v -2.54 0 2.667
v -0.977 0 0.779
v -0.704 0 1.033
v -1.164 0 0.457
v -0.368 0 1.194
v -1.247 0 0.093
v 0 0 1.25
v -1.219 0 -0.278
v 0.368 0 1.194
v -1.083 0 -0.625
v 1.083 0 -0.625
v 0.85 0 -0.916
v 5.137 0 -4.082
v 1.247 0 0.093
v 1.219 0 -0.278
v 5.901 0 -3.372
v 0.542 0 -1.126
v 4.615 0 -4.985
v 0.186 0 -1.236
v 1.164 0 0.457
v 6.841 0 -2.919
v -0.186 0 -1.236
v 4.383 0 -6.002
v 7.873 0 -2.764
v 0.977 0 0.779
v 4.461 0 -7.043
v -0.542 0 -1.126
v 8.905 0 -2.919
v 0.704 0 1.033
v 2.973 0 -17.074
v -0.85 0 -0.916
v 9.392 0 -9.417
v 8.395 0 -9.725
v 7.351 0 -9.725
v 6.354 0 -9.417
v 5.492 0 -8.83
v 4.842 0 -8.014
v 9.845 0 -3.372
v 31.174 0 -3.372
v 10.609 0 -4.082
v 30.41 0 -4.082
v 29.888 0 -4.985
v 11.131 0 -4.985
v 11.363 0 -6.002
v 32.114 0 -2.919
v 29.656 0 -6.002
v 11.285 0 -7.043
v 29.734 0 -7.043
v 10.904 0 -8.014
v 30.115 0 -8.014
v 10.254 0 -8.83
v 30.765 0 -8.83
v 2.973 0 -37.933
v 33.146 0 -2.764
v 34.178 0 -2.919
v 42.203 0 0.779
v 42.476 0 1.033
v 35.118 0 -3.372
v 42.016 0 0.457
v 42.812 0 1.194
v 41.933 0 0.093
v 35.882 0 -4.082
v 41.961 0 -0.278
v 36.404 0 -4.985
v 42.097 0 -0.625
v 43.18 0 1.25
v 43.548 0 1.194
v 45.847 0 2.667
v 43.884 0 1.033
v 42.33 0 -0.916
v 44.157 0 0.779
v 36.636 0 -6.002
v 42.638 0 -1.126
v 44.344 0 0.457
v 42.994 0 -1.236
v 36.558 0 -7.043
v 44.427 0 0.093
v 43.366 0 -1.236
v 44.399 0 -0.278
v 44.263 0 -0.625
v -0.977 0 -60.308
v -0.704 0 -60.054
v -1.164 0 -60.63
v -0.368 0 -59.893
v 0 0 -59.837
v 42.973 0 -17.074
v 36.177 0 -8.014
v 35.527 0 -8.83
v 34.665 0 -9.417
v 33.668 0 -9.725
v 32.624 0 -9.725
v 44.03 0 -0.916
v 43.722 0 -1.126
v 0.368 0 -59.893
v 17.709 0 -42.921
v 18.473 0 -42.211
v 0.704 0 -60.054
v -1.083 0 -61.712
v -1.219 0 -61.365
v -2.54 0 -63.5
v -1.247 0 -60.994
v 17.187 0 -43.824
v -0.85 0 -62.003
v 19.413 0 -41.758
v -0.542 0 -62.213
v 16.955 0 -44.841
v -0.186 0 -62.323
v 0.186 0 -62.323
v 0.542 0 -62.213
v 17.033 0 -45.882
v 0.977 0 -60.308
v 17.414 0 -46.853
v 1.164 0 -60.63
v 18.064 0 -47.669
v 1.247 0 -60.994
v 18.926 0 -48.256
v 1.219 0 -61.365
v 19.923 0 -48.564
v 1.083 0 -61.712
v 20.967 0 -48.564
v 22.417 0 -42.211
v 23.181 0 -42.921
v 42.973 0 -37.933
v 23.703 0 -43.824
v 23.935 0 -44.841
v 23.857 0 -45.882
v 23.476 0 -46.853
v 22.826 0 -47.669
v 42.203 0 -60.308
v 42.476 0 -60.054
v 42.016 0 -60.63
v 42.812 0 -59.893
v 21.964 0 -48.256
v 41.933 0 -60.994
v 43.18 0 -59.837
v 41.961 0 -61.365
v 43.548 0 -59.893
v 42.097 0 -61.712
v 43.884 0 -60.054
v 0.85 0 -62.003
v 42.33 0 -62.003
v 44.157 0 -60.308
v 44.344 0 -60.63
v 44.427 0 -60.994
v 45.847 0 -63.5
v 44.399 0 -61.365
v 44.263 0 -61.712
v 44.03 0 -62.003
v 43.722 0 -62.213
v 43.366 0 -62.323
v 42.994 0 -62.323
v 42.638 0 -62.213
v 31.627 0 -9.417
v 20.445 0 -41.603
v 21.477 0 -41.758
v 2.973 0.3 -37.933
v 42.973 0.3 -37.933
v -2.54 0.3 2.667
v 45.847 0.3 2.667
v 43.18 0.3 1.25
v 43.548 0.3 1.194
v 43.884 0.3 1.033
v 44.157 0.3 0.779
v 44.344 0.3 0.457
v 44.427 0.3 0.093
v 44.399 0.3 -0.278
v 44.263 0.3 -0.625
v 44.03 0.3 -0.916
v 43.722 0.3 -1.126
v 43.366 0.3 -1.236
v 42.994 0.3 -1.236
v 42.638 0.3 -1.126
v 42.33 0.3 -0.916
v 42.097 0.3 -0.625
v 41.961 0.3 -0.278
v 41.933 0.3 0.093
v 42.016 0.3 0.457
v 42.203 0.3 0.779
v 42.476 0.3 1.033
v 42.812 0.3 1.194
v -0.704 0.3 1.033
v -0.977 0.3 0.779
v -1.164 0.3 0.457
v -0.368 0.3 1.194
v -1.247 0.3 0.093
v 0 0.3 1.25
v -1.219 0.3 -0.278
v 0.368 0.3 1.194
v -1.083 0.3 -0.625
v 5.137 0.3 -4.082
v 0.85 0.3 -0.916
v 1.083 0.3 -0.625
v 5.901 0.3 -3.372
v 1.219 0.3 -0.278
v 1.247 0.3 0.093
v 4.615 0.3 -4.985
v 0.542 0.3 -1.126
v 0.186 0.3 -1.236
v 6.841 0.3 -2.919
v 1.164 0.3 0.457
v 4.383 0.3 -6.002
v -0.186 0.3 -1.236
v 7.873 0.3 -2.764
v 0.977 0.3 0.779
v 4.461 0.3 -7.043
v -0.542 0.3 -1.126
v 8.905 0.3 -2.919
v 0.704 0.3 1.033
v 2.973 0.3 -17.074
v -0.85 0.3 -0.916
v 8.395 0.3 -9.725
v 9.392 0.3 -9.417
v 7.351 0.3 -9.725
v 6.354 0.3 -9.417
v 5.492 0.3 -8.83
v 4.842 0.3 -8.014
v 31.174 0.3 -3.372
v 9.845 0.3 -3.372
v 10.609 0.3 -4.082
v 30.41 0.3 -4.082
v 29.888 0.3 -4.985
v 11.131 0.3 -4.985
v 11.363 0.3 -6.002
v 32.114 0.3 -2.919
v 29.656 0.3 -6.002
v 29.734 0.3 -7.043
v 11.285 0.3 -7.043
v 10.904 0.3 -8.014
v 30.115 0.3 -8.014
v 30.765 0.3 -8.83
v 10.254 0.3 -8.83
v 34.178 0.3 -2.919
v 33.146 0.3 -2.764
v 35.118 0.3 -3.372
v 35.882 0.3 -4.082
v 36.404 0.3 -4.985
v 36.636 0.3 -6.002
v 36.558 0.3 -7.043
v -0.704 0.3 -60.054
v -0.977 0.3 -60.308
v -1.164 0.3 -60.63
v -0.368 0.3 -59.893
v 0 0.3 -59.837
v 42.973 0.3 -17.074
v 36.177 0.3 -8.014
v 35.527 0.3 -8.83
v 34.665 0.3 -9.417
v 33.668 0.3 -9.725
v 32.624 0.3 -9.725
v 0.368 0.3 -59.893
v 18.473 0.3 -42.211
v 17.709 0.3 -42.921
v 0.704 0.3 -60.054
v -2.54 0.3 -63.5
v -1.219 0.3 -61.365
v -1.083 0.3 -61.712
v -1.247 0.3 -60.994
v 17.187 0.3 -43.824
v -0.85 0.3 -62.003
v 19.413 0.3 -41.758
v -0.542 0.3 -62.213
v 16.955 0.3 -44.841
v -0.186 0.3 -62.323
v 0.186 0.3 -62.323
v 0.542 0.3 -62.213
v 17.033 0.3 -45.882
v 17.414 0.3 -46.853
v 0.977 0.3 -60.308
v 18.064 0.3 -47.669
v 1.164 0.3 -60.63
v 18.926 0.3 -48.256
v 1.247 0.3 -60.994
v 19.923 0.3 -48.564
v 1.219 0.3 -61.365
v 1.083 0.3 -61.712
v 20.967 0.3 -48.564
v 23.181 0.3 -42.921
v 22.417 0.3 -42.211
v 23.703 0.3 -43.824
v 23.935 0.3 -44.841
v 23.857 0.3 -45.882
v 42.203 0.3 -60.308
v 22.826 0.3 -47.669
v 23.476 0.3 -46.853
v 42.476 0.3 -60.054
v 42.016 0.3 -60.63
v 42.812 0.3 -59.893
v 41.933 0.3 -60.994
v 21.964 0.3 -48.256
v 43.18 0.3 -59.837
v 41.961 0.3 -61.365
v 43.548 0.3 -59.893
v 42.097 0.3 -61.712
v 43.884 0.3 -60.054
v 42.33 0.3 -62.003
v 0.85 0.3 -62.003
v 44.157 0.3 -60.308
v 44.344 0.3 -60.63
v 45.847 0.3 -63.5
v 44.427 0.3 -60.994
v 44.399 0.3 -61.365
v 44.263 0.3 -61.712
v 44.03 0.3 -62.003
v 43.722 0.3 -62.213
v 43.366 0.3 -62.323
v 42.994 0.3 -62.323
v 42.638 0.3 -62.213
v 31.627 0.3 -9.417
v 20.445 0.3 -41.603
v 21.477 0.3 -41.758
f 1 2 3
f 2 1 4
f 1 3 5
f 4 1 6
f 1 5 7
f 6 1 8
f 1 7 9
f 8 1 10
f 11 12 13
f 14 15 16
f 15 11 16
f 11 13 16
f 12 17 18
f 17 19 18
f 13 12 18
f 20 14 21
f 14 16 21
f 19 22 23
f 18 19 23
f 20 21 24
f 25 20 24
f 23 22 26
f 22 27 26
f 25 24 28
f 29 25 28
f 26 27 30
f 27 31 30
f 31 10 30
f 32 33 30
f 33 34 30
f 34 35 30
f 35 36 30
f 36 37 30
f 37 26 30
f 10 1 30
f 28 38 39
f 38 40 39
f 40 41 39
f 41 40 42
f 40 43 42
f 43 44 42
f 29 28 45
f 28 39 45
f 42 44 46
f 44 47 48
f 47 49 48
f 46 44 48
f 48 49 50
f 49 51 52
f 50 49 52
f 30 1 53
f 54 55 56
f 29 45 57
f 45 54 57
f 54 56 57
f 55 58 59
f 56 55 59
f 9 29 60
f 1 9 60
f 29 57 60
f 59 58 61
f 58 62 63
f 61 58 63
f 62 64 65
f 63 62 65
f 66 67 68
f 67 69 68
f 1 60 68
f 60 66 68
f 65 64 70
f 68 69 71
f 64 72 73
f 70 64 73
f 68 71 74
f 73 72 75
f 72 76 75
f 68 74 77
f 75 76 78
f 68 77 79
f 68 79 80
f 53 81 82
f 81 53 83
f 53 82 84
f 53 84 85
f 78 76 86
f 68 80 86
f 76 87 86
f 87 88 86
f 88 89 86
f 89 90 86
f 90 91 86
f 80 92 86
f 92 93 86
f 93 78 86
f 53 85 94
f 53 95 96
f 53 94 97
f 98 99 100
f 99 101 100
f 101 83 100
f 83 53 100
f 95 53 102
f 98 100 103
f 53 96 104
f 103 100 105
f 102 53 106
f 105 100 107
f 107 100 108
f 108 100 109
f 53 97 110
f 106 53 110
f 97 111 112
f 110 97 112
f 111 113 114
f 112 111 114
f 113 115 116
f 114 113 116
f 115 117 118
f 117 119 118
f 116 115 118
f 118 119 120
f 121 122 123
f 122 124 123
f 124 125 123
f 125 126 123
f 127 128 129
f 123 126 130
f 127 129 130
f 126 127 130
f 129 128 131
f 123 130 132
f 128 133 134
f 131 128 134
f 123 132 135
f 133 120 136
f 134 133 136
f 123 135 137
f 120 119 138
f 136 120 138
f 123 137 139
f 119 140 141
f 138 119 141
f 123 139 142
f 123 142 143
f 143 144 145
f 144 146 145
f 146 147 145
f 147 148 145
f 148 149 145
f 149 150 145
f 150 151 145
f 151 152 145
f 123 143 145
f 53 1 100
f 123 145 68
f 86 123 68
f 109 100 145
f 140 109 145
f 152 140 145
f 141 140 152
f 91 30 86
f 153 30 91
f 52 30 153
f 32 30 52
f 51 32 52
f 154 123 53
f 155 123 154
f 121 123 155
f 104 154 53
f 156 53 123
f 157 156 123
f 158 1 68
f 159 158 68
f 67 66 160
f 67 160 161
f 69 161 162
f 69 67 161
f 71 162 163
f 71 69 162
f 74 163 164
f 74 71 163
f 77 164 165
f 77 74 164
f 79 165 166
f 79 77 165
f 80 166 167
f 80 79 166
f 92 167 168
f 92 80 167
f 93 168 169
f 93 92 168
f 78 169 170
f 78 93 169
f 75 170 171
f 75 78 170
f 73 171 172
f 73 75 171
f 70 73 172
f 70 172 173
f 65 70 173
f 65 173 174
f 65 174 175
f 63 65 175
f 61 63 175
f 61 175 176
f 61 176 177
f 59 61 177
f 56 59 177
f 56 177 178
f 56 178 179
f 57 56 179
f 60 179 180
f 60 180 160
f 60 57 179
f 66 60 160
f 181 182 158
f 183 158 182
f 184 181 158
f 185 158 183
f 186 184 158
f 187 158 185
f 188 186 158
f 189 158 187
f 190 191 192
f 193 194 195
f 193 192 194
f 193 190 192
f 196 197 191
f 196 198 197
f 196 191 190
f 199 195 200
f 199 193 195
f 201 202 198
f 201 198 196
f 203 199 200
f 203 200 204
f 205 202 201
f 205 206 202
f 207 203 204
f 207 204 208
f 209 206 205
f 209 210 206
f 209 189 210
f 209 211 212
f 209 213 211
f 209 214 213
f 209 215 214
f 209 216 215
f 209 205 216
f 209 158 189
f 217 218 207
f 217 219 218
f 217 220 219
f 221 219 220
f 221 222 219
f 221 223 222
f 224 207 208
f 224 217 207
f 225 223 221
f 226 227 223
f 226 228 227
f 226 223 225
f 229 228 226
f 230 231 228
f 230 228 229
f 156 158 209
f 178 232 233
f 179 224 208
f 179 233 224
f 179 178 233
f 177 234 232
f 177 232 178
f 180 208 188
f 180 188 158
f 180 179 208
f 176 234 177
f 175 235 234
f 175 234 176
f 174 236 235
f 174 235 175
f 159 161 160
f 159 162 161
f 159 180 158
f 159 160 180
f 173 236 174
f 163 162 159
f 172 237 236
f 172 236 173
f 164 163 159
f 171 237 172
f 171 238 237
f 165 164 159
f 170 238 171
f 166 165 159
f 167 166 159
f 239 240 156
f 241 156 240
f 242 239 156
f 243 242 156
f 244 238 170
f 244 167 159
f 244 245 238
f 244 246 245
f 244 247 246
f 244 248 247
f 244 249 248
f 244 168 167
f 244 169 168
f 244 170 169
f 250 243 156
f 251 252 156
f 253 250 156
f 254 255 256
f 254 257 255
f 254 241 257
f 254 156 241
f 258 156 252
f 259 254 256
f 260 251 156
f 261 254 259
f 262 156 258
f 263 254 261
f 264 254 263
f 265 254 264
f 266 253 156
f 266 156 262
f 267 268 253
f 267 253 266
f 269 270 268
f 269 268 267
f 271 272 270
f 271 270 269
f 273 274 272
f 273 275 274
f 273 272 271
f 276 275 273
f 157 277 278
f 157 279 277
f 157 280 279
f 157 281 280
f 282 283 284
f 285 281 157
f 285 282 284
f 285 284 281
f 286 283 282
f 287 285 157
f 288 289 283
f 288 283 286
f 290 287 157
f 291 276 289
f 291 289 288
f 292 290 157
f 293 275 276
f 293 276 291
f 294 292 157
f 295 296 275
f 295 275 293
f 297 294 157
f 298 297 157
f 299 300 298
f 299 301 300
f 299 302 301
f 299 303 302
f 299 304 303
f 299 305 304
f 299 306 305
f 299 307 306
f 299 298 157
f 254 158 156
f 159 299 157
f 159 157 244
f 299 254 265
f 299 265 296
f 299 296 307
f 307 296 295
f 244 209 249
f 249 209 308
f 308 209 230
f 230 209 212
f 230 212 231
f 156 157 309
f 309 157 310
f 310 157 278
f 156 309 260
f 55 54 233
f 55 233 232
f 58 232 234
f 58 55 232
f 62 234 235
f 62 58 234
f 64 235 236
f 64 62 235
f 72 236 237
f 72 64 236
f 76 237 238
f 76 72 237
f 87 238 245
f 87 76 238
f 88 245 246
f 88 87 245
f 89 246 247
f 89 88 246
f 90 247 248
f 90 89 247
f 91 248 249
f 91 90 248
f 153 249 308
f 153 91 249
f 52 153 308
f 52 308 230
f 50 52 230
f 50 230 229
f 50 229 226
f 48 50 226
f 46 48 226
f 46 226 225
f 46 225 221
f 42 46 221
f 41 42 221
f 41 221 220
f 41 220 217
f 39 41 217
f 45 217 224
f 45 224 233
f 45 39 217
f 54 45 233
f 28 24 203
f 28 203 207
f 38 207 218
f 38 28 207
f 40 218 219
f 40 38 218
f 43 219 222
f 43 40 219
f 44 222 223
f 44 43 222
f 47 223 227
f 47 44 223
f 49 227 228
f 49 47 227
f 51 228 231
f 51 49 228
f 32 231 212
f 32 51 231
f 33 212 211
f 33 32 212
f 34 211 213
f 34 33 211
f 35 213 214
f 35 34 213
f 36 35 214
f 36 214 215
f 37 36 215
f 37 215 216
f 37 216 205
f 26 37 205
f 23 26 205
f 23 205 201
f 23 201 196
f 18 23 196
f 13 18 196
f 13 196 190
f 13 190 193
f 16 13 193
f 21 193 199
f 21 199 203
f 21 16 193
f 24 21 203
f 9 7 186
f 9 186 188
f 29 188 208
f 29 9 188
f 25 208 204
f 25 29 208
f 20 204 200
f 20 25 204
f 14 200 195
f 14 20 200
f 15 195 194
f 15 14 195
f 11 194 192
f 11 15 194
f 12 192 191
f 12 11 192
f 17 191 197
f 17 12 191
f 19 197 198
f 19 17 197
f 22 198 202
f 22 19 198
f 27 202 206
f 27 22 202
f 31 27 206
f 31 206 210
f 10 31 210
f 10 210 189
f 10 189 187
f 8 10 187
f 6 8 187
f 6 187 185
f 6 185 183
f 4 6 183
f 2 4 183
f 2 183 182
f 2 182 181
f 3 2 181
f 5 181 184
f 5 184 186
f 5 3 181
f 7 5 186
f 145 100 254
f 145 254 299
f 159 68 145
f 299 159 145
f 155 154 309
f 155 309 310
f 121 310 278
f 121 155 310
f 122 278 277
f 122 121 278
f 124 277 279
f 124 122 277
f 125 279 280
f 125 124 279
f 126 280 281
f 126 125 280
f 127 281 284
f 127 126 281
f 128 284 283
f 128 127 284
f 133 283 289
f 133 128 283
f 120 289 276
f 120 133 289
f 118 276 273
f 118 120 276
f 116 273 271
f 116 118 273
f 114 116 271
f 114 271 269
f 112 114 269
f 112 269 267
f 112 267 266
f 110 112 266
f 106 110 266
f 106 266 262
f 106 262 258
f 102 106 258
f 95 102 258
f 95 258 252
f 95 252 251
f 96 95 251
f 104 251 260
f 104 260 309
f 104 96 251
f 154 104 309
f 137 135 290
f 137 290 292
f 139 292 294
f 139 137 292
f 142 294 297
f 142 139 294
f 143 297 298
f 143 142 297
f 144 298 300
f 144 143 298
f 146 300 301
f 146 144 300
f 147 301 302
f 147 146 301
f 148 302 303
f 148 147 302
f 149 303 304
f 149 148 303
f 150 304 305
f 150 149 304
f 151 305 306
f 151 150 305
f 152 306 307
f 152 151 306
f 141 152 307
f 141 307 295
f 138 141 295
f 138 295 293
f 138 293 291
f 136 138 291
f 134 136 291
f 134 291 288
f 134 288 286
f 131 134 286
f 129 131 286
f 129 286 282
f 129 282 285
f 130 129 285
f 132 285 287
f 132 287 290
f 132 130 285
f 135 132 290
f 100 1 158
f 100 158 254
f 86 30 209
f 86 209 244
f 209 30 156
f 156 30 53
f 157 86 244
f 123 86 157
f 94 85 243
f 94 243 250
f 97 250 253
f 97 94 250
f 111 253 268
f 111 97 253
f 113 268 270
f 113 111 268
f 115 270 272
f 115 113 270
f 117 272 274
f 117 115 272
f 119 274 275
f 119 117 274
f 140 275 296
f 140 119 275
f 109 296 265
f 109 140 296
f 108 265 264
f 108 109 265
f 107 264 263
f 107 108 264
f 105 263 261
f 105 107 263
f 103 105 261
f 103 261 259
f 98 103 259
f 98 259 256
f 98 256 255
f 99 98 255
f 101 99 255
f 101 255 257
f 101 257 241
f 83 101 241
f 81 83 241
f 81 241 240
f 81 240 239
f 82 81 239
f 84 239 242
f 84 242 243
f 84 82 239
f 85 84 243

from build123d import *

# Parameters (mm, degrees)
SKETCH1_W           = 48.387
SKETCH1_H           = 66.167
SKETCH1_R           = 1.25
SKETCH1_R_2         = 3.5
SKETCH1_W_2         = 40
SKETCH1_H_2         = 20.859720554
BOSS_EXTRUDE1_DEPTH = 0.3


with BuildPart() as part:
    # Sketch1 → Boss-Extrude1 (new body)
    with BuildSketch(Plane(origin=(0, 0, 0), x_dir=(1, 0, 0), z_dir=(0, 1, 0))):
        with Locations((21.6535, 30.4165)):
            Rectangle(SKETCH1_W, SKETCH1_H)
        with Locations(Location((0, 61.087, 0), (0, 0, 270))):
            Circle(SKETCH1_R, mode=Mode.SUBTRACT)
        with Locations(Location((43.18, 61.087, 0), (0, 0, 270))):
            Circle(SKETCH1_R, mode=Mode.SUBTRACT)
        with Locations(Location((43.18, 0, 0), (0, 0, 270))):
            Circle(SKETCH1_R, mode=Mode.SUBTRACT)
        with Locations(Location((0, 0, 0), (0, 0, 270))):
            Circle(SKETCH1_R, mode=Mode.SUBTRACT)
        with Locations(Location((20.445, 45.103, 0), (0, 0, 270))):
            Circle(SKETCH1_R_2, mode=Mode.SUBTRACT)
        with Locations(Location((33.146, 6.264, 0), (0, 0, 270))):
            Circle(SKETCH1_R_2, mode=Mode.SUBTRACT)
        with Locations(Location((7.873, 6.264, 0), (0, 0, 270))):
            Circle(SKETCH1_R_2, mode=Mode.SUBTRACT)
        with Locations((22.973, 27.503426638)):
            Rectangle(SKETCH1_W_2, SKETCH1_H_2, mode=Mode.SUBTRACT)
    extrude(amount=BOSS_EXTRUDE1_DEPTH)


solid = part.part
